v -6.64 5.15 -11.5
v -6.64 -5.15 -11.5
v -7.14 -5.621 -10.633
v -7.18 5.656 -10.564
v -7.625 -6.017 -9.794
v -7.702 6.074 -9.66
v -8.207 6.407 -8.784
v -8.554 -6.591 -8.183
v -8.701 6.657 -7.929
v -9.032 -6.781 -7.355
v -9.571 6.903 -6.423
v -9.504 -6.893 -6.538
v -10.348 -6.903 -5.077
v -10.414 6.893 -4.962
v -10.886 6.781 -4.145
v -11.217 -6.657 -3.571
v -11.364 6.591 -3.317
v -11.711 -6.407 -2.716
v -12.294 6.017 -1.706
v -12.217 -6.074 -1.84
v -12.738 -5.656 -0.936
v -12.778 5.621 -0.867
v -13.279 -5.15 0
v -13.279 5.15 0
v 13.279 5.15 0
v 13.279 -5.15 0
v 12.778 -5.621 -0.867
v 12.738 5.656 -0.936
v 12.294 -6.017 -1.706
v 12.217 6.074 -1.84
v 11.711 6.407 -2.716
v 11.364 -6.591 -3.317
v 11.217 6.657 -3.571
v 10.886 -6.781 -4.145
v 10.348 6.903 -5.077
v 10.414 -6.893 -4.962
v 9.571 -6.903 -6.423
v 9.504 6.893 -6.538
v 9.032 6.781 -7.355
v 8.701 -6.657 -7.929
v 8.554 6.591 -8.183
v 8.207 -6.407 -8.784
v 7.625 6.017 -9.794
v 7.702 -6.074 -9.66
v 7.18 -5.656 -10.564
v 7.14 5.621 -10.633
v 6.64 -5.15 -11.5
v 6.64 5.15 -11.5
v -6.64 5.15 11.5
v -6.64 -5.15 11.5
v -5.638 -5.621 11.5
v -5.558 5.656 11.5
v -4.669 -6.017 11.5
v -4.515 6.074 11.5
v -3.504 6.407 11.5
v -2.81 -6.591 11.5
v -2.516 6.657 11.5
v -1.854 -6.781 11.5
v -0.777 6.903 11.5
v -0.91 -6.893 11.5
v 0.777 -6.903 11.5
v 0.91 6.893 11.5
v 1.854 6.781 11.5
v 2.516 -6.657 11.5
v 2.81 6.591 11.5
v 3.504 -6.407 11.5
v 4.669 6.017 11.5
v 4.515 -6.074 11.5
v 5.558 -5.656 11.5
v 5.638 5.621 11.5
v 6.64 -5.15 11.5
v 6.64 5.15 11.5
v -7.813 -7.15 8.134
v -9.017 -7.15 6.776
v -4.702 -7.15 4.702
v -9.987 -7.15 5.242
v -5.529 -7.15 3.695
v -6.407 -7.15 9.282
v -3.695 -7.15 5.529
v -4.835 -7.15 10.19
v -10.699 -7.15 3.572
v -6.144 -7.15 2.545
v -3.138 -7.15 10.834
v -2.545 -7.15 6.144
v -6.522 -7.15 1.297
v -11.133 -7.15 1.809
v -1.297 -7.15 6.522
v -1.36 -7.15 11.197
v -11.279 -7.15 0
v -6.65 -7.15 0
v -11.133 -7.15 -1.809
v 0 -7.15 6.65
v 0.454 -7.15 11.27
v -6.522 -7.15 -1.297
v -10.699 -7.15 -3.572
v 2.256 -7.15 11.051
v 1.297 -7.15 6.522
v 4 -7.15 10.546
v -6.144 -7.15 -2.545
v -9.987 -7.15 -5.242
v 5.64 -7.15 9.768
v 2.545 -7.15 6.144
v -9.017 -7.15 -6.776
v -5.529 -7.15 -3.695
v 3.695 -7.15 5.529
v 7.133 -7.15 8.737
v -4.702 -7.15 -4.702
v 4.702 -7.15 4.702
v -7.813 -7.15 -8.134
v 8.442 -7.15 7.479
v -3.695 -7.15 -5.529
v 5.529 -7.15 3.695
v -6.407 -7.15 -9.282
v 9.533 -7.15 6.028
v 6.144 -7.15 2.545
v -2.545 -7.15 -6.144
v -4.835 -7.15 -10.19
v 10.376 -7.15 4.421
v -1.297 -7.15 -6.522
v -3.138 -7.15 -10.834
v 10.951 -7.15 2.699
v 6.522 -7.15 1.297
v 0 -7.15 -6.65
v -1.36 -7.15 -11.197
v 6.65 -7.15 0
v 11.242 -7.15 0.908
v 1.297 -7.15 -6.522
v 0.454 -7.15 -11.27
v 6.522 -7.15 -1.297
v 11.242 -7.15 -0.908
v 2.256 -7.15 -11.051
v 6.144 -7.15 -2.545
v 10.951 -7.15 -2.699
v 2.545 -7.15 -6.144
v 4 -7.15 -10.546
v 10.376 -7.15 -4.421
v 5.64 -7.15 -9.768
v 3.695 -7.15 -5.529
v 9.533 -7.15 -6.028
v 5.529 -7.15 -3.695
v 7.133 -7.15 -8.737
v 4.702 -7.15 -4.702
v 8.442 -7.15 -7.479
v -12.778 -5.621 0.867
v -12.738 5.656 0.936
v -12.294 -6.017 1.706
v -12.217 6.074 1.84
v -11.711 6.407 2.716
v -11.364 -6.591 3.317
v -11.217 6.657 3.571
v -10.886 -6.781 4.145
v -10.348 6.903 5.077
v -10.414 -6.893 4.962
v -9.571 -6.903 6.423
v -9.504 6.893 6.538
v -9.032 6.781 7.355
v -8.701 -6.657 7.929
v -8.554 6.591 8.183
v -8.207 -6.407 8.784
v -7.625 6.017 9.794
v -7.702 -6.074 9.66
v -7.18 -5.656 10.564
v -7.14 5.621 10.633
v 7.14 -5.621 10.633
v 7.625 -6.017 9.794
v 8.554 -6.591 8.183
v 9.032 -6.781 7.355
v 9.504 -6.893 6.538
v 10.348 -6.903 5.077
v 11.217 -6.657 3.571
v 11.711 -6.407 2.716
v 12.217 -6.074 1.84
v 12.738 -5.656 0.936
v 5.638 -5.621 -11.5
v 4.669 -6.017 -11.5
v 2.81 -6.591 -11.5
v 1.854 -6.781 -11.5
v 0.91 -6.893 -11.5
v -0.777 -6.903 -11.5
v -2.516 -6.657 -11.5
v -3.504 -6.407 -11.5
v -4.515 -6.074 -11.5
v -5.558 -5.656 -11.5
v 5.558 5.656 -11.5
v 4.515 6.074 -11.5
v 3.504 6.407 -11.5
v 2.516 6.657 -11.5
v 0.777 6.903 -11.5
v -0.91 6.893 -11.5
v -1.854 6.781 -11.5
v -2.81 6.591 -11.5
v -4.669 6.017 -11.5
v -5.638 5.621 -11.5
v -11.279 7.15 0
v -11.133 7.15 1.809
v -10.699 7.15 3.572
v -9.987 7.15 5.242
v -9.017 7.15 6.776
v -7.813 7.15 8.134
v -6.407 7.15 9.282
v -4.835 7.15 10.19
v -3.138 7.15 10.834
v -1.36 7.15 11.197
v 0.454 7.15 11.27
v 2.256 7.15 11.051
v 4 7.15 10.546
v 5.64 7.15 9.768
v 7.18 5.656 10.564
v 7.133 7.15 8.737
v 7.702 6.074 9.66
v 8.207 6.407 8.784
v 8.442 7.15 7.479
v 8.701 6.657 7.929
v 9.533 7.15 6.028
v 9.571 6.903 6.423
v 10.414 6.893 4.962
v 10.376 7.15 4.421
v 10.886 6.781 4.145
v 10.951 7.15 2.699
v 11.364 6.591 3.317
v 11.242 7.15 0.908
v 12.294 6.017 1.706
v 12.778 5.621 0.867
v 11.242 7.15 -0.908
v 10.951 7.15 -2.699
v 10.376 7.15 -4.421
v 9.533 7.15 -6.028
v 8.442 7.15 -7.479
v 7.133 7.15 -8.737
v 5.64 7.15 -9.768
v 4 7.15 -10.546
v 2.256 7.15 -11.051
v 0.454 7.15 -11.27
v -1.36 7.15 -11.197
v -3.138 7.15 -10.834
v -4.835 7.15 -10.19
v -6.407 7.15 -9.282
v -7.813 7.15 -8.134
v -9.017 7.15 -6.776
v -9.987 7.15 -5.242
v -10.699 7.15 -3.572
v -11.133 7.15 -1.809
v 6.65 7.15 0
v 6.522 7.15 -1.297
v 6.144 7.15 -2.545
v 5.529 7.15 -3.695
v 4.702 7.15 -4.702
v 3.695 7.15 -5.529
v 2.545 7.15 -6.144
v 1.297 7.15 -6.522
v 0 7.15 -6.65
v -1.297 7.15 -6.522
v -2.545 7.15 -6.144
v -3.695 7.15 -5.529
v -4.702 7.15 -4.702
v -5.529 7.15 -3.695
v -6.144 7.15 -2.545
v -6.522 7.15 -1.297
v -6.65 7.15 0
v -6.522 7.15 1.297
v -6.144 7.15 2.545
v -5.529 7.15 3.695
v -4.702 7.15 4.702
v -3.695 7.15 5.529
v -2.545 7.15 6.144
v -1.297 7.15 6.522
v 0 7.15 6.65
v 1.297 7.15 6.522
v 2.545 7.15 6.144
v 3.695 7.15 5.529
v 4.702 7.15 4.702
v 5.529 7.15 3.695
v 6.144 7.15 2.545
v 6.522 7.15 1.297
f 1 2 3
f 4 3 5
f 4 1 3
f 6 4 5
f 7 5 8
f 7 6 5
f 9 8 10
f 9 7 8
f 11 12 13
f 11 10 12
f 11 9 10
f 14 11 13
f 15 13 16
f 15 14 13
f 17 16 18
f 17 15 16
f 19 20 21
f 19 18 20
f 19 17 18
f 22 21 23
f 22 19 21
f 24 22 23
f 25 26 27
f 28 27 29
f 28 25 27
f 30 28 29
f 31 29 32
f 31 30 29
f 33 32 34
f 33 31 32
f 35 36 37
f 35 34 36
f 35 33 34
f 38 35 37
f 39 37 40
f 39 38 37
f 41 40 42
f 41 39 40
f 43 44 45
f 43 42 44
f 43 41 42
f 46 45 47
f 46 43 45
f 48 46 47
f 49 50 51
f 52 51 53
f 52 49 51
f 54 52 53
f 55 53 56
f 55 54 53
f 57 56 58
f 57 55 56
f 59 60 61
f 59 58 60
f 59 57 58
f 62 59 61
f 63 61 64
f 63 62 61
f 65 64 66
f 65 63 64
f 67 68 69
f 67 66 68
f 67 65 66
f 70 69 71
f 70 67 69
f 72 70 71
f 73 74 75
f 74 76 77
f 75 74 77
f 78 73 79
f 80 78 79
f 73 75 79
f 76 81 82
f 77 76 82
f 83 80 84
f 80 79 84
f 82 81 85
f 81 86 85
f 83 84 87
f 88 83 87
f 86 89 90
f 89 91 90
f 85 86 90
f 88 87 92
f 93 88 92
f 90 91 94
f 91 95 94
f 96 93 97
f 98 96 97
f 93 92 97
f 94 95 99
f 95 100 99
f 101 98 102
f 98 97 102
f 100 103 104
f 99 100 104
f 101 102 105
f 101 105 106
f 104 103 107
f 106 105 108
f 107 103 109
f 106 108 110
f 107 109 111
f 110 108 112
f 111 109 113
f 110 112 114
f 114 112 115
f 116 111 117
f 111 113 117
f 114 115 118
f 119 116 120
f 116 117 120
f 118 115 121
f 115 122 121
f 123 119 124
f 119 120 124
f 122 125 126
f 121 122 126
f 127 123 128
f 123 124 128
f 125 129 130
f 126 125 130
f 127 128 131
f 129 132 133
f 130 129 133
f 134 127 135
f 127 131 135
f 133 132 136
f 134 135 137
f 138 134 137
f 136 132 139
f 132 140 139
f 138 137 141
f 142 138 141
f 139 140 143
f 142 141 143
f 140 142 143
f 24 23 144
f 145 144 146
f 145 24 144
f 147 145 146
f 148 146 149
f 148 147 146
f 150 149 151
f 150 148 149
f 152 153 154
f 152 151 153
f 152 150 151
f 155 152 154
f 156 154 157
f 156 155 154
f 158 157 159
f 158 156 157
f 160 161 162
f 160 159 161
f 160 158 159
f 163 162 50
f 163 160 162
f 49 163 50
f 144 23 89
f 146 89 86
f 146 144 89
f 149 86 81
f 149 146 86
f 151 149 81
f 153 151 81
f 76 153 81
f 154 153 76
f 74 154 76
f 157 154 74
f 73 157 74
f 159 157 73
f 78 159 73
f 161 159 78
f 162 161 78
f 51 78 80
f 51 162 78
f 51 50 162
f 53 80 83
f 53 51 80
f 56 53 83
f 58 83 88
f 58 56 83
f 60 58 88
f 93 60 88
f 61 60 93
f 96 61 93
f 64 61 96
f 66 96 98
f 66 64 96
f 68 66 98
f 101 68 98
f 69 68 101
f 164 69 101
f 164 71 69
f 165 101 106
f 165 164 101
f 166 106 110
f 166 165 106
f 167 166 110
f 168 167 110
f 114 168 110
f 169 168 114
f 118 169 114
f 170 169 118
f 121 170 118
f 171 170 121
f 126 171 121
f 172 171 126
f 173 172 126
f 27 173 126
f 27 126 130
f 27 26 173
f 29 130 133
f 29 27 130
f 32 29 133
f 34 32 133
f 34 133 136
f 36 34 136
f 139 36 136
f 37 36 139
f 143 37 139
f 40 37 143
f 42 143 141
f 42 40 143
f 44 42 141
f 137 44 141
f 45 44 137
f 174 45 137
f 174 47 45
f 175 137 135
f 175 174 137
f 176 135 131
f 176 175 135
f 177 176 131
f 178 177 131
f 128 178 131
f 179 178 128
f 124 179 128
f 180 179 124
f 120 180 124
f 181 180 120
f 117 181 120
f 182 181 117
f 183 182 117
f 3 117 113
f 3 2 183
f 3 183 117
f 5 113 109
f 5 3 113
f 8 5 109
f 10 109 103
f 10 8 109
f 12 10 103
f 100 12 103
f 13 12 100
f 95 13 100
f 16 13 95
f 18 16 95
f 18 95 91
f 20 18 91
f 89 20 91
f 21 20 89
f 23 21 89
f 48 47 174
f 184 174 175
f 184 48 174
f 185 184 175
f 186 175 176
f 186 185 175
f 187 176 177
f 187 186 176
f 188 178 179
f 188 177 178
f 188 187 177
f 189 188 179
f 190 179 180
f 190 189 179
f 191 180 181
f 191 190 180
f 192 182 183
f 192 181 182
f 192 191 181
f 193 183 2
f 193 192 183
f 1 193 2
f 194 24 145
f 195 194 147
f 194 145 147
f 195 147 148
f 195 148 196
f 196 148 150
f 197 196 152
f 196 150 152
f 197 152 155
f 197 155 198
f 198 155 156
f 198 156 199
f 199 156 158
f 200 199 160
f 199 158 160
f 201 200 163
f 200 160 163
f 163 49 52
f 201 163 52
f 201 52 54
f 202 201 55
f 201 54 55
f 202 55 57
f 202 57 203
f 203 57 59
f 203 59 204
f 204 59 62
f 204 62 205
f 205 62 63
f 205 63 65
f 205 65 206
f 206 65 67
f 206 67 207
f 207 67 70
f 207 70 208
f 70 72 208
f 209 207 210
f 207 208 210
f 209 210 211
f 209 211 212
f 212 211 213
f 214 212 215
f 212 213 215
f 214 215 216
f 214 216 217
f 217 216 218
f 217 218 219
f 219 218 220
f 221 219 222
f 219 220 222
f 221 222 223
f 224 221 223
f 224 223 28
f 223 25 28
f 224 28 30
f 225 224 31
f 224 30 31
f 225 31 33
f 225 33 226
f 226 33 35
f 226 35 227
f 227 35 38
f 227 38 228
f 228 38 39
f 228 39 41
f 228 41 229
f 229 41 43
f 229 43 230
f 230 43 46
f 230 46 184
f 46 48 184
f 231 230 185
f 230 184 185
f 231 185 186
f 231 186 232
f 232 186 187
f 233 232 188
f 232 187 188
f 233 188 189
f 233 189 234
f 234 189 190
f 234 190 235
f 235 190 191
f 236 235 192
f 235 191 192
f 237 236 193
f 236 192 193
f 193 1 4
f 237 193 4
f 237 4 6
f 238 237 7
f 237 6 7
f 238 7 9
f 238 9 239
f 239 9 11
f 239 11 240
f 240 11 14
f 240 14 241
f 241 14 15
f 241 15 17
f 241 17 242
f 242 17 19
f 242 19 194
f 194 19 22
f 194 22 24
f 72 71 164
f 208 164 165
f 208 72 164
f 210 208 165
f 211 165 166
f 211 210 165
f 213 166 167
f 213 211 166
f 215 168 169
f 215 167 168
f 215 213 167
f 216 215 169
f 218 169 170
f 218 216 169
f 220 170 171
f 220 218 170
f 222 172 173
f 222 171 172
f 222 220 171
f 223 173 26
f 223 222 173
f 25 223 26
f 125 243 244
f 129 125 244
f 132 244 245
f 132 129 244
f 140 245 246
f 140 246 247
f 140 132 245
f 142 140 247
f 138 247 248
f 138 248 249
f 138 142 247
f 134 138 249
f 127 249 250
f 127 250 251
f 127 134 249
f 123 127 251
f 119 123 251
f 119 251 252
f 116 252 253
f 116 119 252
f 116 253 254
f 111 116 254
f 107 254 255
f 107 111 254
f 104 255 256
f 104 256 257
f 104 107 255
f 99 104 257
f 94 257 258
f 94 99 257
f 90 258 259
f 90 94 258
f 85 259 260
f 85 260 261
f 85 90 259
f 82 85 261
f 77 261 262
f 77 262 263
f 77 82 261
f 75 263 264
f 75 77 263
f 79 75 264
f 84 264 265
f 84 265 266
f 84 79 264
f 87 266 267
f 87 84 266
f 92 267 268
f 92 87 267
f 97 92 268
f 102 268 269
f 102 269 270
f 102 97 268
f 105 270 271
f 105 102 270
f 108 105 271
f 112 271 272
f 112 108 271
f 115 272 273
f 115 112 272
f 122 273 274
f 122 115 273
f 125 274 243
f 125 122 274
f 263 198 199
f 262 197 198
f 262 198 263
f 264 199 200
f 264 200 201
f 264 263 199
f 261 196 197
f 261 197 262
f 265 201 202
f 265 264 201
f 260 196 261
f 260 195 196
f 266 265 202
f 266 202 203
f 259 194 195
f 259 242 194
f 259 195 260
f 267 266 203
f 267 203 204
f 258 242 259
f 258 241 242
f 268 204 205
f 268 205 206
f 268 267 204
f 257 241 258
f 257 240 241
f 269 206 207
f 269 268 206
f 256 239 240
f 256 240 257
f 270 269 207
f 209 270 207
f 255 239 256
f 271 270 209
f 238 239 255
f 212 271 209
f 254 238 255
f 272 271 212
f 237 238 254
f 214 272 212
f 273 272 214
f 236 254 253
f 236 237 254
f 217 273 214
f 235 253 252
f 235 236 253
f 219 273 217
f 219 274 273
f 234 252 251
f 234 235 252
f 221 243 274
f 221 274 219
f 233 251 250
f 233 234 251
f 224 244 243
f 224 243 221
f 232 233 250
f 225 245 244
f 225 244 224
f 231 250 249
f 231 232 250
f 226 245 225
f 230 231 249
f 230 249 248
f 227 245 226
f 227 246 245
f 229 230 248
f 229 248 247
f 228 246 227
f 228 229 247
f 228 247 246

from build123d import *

# Parameters (mm, degrees)
CROQUIS1_R              = 6.65
SALIENTE_EXTRUIR1_DEPTH = 7.15


with BuildPart() as part:
    # Croquis1 → Saliente-Extruir1 (new body, symmetric)
    with BuildSketch(Plane(origin=(0, 0, 0), x_dir=(1, 0, 0), z_dir=(0, 1, 0))):
        Polygon((13.279056191, 0), (6.639528096, 11.5), (-6.639528096, 11.5), (-13.279056191, 0), (-6.639528096, -11.5), (6.639528096, -11.5), align=None)
        Circle(CROQUIS1_R, mode=Mode.SUBTRACT)
    extrude(amount=SALIENTE_EXTRUIR1_DEPTH, both=True)

    # Croquis2 → Cortar-Revolución1 (revolve, cut)
    with BuildSketch(Plane.XY):
        Polygon((-11.279056191, 7.15), (-13.279056191, 5.15), (-13.279056191, 7.15), align=None)
    cortar_revoluci_n1 = revolve(axis=Axis((0, 7.15, 0), (0, 1, 0)), mode=Mode.SUBTRACT)

    # Simetría1: Cortar-Revolución1 across plane
    add(cortar_revoluci_n1.mirror(Plane.ZX), mode=Mode.SUBTRACT)


solid = part.part
